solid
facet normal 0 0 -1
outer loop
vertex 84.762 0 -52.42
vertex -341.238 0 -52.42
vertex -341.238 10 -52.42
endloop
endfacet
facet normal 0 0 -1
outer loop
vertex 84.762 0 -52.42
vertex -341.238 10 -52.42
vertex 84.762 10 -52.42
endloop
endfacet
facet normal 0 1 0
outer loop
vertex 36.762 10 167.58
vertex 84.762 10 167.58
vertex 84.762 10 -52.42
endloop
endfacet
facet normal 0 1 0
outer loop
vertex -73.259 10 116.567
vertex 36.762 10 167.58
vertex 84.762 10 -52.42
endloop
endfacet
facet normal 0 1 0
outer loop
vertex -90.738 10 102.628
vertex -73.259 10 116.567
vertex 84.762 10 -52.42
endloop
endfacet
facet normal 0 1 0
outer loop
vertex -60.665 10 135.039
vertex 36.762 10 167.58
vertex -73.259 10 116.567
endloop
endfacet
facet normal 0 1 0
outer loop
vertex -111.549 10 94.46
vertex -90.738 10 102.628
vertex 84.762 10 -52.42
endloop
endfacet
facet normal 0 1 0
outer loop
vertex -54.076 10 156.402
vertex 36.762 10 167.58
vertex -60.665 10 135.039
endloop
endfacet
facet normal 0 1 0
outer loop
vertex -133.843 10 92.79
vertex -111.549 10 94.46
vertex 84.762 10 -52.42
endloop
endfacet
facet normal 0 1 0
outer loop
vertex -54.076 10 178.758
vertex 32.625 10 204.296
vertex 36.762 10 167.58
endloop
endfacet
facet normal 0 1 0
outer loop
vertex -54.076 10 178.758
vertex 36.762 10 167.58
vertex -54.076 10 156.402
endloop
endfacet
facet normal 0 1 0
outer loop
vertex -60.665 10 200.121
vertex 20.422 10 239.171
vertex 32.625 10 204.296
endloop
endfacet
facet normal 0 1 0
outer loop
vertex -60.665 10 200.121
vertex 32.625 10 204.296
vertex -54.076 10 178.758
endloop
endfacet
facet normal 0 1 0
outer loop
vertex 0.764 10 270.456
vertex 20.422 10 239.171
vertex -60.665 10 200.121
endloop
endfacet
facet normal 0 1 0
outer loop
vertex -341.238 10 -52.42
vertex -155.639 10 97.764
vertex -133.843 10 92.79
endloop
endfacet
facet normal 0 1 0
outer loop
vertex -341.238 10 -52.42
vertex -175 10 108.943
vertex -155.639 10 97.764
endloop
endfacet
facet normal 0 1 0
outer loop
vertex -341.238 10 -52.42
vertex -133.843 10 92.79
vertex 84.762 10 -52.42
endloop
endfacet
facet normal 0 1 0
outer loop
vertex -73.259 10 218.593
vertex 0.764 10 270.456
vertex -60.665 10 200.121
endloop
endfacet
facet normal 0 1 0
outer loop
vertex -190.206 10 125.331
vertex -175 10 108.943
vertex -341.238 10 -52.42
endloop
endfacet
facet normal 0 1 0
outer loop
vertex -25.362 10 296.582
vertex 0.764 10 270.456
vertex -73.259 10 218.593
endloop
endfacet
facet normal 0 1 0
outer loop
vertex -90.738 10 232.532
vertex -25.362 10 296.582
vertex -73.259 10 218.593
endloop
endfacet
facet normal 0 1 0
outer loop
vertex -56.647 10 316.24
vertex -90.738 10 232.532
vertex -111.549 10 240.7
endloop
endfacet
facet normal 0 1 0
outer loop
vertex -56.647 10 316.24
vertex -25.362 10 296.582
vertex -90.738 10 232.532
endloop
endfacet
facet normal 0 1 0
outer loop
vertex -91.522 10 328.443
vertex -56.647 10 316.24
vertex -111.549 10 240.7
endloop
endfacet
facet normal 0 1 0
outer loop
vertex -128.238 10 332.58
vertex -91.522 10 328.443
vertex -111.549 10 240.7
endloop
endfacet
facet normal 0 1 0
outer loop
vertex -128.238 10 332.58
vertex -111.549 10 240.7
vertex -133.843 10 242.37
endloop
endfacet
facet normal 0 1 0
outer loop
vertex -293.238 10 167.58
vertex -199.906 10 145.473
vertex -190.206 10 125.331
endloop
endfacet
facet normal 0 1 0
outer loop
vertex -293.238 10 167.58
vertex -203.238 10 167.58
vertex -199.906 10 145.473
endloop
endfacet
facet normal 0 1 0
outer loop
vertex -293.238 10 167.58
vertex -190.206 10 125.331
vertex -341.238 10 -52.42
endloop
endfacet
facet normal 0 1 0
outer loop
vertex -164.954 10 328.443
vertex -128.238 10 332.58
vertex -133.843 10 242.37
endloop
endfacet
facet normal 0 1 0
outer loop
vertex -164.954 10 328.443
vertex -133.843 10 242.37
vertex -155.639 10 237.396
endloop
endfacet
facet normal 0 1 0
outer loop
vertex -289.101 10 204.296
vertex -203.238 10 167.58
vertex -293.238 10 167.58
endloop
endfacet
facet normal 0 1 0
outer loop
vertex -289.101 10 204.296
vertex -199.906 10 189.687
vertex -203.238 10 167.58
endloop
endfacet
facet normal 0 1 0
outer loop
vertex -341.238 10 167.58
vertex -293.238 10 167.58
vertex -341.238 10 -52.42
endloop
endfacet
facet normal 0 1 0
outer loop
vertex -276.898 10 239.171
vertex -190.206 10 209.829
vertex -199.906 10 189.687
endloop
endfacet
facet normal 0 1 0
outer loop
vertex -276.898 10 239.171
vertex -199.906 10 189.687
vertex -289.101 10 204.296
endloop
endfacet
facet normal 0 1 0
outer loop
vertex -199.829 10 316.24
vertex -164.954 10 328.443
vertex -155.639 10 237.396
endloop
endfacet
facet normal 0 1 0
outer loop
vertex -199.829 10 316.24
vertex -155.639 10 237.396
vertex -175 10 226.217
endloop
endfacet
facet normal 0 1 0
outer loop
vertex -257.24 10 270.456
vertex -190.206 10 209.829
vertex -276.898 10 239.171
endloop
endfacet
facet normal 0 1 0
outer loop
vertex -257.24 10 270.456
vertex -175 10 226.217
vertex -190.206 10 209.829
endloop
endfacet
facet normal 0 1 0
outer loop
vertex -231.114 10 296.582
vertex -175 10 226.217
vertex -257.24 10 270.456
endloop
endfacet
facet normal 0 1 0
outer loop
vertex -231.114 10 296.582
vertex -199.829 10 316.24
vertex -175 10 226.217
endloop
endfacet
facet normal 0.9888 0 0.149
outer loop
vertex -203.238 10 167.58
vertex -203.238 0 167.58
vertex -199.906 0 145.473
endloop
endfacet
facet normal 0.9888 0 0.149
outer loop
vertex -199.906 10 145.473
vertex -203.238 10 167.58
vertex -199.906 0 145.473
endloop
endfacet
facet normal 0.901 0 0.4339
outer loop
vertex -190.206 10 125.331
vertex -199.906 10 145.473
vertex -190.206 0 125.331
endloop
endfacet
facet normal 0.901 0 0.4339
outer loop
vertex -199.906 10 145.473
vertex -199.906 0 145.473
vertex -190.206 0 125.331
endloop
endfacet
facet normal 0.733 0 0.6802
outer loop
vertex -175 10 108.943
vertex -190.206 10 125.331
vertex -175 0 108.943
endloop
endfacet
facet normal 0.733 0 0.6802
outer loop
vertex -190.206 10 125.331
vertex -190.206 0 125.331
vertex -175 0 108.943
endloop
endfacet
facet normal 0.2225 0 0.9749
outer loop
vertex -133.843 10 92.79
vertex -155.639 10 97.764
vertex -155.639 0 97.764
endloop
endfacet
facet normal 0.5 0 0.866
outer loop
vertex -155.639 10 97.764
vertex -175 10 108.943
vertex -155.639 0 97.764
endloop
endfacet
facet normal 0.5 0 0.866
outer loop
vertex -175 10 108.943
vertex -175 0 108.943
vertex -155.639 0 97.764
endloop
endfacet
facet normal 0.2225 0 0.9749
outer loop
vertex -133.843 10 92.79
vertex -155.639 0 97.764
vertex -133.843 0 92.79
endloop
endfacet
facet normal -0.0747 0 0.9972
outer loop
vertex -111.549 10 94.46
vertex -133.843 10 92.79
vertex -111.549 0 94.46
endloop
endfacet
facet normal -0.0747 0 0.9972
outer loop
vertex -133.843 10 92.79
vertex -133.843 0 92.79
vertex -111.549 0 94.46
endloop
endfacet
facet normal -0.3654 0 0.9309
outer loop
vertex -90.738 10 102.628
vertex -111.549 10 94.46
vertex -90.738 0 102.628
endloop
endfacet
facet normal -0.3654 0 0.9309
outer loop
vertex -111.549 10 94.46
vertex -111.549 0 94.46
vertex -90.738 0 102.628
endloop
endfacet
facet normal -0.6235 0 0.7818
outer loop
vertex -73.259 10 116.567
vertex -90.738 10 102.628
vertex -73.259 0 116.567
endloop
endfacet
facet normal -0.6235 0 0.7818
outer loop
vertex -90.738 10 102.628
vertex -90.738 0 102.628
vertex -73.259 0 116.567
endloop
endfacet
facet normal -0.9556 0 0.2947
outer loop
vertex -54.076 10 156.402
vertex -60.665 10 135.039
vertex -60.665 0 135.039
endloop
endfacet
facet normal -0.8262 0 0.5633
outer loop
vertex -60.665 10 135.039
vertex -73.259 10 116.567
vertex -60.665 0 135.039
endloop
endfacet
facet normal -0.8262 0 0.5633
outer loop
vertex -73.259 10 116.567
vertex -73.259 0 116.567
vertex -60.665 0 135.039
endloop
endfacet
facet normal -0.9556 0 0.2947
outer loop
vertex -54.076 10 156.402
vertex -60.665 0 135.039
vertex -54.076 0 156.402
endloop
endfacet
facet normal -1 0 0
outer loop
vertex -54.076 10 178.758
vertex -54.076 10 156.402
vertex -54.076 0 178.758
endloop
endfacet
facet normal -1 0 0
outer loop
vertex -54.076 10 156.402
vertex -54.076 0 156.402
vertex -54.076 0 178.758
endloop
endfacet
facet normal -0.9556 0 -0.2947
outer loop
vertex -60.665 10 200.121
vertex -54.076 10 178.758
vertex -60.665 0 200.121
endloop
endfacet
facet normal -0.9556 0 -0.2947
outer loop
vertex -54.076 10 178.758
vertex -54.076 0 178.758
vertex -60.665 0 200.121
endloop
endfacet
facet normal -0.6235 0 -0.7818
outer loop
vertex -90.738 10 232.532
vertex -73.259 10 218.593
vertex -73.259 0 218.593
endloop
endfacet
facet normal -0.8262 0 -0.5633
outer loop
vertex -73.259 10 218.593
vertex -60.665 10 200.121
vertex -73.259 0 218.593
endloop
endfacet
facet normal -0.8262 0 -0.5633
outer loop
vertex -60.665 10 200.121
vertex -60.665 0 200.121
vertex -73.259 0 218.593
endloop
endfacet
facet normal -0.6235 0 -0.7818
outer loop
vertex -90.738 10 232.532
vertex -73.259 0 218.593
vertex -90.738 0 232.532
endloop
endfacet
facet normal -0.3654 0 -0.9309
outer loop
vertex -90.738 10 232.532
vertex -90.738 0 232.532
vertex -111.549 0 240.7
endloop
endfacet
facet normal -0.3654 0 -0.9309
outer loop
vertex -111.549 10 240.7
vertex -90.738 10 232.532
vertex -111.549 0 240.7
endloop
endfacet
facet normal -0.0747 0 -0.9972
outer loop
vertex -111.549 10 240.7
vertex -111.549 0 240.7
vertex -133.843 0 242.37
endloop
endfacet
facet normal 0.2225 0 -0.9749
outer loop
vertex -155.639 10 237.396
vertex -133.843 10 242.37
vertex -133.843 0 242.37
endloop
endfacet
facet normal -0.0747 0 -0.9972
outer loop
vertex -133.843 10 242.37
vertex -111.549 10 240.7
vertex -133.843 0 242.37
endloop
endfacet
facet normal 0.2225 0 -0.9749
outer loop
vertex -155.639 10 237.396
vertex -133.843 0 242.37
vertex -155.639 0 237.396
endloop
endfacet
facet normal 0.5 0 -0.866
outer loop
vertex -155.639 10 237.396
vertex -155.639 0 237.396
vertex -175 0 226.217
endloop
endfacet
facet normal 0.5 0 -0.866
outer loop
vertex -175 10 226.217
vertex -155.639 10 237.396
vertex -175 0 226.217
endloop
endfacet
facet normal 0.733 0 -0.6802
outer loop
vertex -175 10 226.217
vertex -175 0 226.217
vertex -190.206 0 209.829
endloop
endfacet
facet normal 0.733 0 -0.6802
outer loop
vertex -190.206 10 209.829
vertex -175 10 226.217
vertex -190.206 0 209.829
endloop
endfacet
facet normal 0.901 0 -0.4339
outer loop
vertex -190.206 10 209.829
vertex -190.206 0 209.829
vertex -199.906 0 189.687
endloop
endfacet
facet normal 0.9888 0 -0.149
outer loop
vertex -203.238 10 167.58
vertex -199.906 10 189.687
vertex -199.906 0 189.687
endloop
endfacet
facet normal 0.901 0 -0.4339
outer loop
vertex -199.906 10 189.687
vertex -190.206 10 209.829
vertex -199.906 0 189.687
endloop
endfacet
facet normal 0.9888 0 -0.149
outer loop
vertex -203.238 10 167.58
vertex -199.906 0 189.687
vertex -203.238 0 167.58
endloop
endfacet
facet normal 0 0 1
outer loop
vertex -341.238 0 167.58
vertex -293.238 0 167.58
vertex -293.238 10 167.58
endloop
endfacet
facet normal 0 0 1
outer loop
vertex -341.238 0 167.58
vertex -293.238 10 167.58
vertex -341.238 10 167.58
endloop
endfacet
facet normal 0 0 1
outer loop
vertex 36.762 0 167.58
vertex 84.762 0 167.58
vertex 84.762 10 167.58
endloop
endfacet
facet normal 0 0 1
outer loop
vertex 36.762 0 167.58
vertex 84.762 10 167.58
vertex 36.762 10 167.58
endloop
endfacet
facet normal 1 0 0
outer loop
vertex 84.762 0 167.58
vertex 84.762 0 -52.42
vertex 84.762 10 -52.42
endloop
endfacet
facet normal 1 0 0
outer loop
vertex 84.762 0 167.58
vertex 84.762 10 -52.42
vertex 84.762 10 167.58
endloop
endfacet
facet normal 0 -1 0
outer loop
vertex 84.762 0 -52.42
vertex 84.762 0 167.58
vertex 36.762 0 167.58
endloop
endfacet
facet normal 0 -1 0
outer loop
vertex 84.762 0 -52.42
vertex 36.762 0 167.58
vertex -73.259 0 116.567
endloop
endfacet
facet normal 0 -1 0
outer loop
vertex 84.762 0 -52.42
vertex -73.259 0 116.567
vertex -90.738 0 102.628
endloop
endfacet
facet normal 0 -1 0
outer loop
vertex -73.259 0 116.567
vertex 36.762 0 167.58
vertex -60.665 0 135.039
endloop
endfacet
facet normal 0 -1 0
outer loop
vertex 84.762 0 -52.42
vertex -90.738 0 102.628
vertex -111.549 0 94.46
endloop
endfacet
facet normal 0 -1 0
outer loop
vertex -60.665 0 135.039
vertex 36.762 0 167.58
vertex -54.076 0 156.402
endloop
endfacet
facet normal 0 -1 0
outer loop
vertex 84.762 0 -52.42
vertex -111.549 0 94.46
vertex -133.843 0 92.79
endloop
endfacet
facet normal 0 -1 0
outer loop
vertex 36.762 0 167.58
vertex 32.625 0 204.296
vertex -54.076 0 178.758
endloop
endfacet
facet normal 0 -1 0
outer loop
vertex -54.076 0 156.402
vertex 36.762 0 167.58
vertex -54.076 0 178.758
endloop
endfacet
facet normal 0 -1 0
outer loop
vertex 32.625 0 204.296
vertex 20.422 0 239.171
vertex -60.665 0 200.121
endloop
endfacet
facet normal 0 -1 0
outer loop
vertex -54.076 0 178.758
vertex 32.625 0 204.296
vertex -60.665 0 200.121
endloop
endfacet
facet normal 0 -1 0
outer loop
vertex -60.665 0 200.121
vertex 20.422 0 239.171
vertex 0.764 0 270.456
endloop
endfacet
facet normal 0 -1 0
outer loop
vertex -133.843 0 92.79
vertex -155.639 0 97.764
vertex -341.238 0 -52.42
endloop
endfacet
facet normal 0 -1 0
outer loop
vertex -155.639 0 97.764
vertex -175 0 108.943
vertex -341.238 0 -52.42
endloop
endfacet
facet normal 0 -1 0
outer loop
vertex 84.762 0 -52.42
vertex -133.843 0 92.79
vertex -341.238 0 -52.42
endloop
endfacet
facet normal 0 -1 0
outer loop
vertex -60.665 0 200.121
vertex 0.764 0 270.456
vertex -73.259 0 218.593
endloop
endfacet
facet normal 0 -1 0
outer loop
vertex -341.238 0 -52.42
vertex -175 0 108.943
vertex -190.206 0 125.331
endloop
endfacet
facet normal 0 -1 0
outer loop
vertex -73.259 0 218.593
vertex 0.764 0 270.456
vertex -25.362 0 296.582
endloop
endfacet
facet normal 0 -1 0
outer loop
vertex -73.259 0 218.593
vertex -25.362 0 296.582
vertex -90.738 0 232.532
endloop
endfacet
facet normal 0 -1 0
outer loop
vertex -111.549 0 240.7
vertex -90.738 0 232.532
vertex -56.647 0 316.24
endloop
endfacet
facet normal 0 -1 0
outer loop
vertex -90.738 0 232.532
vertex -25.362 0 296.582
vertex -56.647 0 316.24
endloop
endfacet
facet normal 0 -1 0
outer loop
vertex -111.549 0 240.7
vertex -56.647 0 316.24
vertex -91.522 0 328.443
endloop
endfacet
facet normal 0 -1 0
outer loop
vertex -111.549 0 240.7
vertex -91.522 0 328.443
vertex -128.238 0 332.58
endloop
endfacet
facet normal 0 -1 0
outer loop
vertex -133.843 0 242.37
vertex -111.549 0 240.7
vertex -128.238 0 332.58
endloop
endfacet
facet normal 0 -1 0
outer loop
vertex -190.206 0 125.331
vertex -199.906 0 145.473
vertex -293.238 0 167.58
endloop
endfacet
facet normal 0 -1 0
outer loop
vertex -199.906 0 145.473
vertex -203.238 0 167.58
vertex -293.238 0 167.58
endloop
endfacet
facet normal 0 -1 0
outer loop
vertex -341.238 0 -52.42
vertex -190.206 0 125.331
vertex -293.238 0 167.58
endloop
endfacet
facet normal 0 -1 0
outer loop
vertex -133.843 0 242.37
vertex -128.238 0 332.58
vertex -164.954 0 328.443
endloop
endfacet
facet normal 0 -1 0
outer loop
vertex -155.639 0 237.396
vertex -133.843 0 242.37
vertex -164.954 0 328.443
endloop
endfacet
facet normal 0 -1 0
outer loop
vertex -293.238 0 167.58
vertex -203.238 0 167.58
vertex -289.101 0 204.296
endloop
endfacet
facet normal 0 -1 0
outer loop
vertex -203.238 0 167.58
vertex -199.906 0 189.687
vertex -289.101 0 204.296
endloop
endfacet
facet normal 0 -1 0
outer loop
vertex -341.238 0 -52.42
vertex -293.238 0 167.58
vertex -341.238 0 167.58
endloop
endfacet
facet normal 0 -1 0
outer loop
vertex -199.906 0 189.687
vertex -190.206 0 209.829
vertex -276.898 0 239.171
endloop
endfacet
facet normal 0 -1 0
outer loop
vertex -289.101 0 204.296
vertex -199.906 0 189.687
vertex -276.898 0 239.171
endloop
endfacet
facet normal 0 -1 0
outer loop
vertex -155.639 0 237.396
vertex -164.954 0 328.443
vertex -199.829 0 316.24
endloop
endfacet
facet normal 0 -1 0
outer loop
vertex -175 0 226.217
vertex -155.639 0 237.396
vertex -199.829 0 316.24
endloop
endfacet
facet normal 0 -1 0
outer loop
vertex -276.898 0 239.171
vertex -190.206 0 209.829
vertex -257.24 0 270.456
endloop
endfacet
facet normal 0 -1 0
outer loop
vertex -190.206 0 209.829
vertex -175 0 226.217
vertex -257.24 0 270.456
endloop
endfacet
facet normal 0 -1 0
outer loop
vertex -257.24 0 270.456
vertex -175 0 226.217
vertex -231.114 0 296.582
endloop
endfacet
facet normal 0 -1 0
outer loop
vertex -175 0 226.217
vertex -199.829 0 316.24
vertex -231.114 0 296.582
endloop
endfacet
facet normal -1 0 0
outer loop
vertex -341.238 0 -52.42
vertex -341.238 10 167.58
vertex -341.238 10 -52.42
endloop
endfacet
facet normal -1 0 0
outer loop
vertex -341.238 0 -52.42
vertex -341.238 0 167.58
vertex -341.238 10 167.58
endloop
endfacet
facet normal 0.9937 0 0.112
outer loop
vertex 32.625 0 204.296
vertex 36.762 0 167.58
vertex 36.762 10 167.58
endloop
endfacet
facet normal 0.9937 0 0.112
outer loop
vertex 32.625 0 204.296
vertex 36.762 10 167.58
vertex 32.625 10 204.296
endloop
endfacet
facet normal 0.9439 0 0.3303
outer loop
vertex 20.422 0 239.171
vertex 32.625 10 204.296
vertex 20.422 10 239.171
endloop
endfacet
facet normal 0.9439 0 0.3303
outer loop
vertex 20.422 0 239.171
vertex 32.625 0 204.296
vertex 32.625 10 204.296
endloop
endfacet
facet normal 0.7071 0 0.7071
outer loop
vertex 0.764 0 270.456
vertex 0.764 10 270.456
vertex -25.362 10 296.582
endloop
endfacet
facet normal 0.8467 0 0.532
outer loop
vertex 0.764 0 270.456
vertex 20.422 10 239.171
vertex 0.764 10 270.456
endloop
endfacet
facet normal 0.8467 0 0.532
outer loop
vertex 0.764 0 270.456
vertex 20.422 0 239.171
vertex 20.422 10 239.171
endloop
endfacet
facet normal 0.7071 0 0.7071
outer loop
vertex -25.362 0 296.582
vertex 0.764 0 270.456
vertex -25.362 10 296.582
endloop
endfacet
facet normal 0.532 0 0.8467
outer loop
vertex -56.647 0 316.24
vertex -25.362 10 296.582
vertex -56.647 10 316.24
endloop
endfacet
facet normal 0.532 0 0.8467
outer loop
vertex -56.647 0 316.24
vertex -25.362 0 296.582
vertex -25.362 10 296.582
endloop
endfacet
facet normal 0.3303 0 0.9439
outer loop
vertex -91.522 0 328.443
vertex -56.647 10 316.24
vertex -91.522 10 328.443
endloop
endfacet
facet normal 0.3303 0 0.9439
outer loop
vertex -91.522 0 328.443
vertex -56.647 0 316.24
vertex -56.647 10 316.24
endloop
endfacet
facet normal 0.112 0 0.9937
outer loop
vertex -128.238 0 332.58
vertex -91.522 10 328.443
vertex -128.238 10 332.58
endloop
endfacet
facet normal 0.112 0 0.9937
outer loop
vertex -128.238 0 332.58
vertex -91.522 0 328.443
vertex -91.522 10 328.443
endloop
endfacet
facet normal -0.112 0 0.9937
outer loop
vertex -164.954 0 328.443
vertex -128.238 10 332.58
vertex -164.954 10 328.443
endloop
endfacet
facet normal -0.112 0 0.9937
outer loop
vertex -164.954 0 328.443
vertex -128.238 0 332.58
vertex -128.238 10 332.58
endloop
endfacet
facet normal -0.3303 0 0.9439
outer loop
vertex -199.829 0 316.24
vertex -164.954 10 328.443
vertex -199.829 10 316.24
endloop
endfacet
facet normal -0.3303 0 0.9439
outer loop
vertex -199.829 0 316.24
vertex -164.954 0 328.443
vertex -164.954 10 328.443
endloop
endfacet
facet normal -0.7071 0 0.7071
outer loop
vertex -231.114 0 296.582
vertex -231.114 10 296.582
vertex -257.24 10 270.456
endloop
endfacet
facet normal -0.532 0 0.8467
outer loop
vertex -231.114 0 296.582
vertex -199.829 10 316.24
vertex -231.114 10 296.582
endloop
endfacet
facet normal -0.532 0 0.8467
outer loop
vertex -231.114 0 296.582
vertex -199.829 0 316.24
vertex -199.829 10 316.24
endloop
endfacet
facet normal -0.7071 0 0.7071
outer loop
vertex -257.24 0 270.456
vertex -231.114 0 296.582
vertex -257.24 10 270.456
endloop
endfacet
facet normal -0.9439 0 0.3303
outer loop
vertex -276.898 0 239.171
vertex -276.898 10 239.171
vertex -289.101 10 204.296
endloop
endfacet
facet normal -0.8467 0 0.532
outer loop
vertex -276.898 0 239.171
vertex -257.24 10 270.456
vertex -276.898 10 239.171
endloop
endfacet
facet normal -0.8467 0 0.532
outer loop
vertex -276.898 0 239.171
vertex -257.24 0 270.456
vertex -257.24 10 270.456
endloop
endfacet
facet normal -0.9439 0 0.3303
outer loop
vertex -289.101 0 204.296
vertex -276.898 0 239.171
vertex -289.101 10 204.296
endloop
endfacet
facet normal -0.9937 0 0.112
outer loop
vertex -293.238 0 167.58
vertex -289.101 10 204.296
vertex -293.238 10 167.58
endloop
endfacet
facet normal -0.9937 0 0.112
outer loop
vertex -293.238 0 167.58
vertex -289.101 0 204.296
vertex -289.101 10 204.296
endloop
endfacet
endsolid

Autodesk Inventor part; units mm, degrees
ref_plane "YZ Plane" through (0, 0, 0) normal (1, 0, 0) x (0, 1, 0)
ref_plane "XZ Plane" through (0, 0, 0) normal (0, 1, 0) x (-1, 0, 0)
ref_plane "XY Plane" through (0, 0, 0) normal (0, 0, 1) x (1, 0, 0)
sketch "Sketch1" plane through (0, 0, 0) normal (0, 1, 0) x (-1, 0, 0)
  line L0 (341.2381, 167.58) -> (341.2381, -52.42)
  line L1 (341.2381, -52.42) -> (-84.7619, -52.42)
  line L2 (-84.7619, -52.42) -> (-84.7619, 167.58)
  arc A0 (293.2381, 167.58) -> (-36.7619, 167.58) centre (128.2381, 167.58) ccw
  line L3 (-84.7619, 167.58) -> (-36.7619, 167.58)
  line L4 (293.2381, 167.58) -> (341.2381, 167.58)
  circle A1 centre (128.2381, 167.58) radius 75
  point P0 (0, 0)
  dimension "d0" = 426
  dimension "d1" = 220
  dimension "d2" = 330
  dimension "d3" = 150
extrude "Extrusion1" add sketch "Sketch1" along normal blind 10
properties part number "frontPlate_half"
